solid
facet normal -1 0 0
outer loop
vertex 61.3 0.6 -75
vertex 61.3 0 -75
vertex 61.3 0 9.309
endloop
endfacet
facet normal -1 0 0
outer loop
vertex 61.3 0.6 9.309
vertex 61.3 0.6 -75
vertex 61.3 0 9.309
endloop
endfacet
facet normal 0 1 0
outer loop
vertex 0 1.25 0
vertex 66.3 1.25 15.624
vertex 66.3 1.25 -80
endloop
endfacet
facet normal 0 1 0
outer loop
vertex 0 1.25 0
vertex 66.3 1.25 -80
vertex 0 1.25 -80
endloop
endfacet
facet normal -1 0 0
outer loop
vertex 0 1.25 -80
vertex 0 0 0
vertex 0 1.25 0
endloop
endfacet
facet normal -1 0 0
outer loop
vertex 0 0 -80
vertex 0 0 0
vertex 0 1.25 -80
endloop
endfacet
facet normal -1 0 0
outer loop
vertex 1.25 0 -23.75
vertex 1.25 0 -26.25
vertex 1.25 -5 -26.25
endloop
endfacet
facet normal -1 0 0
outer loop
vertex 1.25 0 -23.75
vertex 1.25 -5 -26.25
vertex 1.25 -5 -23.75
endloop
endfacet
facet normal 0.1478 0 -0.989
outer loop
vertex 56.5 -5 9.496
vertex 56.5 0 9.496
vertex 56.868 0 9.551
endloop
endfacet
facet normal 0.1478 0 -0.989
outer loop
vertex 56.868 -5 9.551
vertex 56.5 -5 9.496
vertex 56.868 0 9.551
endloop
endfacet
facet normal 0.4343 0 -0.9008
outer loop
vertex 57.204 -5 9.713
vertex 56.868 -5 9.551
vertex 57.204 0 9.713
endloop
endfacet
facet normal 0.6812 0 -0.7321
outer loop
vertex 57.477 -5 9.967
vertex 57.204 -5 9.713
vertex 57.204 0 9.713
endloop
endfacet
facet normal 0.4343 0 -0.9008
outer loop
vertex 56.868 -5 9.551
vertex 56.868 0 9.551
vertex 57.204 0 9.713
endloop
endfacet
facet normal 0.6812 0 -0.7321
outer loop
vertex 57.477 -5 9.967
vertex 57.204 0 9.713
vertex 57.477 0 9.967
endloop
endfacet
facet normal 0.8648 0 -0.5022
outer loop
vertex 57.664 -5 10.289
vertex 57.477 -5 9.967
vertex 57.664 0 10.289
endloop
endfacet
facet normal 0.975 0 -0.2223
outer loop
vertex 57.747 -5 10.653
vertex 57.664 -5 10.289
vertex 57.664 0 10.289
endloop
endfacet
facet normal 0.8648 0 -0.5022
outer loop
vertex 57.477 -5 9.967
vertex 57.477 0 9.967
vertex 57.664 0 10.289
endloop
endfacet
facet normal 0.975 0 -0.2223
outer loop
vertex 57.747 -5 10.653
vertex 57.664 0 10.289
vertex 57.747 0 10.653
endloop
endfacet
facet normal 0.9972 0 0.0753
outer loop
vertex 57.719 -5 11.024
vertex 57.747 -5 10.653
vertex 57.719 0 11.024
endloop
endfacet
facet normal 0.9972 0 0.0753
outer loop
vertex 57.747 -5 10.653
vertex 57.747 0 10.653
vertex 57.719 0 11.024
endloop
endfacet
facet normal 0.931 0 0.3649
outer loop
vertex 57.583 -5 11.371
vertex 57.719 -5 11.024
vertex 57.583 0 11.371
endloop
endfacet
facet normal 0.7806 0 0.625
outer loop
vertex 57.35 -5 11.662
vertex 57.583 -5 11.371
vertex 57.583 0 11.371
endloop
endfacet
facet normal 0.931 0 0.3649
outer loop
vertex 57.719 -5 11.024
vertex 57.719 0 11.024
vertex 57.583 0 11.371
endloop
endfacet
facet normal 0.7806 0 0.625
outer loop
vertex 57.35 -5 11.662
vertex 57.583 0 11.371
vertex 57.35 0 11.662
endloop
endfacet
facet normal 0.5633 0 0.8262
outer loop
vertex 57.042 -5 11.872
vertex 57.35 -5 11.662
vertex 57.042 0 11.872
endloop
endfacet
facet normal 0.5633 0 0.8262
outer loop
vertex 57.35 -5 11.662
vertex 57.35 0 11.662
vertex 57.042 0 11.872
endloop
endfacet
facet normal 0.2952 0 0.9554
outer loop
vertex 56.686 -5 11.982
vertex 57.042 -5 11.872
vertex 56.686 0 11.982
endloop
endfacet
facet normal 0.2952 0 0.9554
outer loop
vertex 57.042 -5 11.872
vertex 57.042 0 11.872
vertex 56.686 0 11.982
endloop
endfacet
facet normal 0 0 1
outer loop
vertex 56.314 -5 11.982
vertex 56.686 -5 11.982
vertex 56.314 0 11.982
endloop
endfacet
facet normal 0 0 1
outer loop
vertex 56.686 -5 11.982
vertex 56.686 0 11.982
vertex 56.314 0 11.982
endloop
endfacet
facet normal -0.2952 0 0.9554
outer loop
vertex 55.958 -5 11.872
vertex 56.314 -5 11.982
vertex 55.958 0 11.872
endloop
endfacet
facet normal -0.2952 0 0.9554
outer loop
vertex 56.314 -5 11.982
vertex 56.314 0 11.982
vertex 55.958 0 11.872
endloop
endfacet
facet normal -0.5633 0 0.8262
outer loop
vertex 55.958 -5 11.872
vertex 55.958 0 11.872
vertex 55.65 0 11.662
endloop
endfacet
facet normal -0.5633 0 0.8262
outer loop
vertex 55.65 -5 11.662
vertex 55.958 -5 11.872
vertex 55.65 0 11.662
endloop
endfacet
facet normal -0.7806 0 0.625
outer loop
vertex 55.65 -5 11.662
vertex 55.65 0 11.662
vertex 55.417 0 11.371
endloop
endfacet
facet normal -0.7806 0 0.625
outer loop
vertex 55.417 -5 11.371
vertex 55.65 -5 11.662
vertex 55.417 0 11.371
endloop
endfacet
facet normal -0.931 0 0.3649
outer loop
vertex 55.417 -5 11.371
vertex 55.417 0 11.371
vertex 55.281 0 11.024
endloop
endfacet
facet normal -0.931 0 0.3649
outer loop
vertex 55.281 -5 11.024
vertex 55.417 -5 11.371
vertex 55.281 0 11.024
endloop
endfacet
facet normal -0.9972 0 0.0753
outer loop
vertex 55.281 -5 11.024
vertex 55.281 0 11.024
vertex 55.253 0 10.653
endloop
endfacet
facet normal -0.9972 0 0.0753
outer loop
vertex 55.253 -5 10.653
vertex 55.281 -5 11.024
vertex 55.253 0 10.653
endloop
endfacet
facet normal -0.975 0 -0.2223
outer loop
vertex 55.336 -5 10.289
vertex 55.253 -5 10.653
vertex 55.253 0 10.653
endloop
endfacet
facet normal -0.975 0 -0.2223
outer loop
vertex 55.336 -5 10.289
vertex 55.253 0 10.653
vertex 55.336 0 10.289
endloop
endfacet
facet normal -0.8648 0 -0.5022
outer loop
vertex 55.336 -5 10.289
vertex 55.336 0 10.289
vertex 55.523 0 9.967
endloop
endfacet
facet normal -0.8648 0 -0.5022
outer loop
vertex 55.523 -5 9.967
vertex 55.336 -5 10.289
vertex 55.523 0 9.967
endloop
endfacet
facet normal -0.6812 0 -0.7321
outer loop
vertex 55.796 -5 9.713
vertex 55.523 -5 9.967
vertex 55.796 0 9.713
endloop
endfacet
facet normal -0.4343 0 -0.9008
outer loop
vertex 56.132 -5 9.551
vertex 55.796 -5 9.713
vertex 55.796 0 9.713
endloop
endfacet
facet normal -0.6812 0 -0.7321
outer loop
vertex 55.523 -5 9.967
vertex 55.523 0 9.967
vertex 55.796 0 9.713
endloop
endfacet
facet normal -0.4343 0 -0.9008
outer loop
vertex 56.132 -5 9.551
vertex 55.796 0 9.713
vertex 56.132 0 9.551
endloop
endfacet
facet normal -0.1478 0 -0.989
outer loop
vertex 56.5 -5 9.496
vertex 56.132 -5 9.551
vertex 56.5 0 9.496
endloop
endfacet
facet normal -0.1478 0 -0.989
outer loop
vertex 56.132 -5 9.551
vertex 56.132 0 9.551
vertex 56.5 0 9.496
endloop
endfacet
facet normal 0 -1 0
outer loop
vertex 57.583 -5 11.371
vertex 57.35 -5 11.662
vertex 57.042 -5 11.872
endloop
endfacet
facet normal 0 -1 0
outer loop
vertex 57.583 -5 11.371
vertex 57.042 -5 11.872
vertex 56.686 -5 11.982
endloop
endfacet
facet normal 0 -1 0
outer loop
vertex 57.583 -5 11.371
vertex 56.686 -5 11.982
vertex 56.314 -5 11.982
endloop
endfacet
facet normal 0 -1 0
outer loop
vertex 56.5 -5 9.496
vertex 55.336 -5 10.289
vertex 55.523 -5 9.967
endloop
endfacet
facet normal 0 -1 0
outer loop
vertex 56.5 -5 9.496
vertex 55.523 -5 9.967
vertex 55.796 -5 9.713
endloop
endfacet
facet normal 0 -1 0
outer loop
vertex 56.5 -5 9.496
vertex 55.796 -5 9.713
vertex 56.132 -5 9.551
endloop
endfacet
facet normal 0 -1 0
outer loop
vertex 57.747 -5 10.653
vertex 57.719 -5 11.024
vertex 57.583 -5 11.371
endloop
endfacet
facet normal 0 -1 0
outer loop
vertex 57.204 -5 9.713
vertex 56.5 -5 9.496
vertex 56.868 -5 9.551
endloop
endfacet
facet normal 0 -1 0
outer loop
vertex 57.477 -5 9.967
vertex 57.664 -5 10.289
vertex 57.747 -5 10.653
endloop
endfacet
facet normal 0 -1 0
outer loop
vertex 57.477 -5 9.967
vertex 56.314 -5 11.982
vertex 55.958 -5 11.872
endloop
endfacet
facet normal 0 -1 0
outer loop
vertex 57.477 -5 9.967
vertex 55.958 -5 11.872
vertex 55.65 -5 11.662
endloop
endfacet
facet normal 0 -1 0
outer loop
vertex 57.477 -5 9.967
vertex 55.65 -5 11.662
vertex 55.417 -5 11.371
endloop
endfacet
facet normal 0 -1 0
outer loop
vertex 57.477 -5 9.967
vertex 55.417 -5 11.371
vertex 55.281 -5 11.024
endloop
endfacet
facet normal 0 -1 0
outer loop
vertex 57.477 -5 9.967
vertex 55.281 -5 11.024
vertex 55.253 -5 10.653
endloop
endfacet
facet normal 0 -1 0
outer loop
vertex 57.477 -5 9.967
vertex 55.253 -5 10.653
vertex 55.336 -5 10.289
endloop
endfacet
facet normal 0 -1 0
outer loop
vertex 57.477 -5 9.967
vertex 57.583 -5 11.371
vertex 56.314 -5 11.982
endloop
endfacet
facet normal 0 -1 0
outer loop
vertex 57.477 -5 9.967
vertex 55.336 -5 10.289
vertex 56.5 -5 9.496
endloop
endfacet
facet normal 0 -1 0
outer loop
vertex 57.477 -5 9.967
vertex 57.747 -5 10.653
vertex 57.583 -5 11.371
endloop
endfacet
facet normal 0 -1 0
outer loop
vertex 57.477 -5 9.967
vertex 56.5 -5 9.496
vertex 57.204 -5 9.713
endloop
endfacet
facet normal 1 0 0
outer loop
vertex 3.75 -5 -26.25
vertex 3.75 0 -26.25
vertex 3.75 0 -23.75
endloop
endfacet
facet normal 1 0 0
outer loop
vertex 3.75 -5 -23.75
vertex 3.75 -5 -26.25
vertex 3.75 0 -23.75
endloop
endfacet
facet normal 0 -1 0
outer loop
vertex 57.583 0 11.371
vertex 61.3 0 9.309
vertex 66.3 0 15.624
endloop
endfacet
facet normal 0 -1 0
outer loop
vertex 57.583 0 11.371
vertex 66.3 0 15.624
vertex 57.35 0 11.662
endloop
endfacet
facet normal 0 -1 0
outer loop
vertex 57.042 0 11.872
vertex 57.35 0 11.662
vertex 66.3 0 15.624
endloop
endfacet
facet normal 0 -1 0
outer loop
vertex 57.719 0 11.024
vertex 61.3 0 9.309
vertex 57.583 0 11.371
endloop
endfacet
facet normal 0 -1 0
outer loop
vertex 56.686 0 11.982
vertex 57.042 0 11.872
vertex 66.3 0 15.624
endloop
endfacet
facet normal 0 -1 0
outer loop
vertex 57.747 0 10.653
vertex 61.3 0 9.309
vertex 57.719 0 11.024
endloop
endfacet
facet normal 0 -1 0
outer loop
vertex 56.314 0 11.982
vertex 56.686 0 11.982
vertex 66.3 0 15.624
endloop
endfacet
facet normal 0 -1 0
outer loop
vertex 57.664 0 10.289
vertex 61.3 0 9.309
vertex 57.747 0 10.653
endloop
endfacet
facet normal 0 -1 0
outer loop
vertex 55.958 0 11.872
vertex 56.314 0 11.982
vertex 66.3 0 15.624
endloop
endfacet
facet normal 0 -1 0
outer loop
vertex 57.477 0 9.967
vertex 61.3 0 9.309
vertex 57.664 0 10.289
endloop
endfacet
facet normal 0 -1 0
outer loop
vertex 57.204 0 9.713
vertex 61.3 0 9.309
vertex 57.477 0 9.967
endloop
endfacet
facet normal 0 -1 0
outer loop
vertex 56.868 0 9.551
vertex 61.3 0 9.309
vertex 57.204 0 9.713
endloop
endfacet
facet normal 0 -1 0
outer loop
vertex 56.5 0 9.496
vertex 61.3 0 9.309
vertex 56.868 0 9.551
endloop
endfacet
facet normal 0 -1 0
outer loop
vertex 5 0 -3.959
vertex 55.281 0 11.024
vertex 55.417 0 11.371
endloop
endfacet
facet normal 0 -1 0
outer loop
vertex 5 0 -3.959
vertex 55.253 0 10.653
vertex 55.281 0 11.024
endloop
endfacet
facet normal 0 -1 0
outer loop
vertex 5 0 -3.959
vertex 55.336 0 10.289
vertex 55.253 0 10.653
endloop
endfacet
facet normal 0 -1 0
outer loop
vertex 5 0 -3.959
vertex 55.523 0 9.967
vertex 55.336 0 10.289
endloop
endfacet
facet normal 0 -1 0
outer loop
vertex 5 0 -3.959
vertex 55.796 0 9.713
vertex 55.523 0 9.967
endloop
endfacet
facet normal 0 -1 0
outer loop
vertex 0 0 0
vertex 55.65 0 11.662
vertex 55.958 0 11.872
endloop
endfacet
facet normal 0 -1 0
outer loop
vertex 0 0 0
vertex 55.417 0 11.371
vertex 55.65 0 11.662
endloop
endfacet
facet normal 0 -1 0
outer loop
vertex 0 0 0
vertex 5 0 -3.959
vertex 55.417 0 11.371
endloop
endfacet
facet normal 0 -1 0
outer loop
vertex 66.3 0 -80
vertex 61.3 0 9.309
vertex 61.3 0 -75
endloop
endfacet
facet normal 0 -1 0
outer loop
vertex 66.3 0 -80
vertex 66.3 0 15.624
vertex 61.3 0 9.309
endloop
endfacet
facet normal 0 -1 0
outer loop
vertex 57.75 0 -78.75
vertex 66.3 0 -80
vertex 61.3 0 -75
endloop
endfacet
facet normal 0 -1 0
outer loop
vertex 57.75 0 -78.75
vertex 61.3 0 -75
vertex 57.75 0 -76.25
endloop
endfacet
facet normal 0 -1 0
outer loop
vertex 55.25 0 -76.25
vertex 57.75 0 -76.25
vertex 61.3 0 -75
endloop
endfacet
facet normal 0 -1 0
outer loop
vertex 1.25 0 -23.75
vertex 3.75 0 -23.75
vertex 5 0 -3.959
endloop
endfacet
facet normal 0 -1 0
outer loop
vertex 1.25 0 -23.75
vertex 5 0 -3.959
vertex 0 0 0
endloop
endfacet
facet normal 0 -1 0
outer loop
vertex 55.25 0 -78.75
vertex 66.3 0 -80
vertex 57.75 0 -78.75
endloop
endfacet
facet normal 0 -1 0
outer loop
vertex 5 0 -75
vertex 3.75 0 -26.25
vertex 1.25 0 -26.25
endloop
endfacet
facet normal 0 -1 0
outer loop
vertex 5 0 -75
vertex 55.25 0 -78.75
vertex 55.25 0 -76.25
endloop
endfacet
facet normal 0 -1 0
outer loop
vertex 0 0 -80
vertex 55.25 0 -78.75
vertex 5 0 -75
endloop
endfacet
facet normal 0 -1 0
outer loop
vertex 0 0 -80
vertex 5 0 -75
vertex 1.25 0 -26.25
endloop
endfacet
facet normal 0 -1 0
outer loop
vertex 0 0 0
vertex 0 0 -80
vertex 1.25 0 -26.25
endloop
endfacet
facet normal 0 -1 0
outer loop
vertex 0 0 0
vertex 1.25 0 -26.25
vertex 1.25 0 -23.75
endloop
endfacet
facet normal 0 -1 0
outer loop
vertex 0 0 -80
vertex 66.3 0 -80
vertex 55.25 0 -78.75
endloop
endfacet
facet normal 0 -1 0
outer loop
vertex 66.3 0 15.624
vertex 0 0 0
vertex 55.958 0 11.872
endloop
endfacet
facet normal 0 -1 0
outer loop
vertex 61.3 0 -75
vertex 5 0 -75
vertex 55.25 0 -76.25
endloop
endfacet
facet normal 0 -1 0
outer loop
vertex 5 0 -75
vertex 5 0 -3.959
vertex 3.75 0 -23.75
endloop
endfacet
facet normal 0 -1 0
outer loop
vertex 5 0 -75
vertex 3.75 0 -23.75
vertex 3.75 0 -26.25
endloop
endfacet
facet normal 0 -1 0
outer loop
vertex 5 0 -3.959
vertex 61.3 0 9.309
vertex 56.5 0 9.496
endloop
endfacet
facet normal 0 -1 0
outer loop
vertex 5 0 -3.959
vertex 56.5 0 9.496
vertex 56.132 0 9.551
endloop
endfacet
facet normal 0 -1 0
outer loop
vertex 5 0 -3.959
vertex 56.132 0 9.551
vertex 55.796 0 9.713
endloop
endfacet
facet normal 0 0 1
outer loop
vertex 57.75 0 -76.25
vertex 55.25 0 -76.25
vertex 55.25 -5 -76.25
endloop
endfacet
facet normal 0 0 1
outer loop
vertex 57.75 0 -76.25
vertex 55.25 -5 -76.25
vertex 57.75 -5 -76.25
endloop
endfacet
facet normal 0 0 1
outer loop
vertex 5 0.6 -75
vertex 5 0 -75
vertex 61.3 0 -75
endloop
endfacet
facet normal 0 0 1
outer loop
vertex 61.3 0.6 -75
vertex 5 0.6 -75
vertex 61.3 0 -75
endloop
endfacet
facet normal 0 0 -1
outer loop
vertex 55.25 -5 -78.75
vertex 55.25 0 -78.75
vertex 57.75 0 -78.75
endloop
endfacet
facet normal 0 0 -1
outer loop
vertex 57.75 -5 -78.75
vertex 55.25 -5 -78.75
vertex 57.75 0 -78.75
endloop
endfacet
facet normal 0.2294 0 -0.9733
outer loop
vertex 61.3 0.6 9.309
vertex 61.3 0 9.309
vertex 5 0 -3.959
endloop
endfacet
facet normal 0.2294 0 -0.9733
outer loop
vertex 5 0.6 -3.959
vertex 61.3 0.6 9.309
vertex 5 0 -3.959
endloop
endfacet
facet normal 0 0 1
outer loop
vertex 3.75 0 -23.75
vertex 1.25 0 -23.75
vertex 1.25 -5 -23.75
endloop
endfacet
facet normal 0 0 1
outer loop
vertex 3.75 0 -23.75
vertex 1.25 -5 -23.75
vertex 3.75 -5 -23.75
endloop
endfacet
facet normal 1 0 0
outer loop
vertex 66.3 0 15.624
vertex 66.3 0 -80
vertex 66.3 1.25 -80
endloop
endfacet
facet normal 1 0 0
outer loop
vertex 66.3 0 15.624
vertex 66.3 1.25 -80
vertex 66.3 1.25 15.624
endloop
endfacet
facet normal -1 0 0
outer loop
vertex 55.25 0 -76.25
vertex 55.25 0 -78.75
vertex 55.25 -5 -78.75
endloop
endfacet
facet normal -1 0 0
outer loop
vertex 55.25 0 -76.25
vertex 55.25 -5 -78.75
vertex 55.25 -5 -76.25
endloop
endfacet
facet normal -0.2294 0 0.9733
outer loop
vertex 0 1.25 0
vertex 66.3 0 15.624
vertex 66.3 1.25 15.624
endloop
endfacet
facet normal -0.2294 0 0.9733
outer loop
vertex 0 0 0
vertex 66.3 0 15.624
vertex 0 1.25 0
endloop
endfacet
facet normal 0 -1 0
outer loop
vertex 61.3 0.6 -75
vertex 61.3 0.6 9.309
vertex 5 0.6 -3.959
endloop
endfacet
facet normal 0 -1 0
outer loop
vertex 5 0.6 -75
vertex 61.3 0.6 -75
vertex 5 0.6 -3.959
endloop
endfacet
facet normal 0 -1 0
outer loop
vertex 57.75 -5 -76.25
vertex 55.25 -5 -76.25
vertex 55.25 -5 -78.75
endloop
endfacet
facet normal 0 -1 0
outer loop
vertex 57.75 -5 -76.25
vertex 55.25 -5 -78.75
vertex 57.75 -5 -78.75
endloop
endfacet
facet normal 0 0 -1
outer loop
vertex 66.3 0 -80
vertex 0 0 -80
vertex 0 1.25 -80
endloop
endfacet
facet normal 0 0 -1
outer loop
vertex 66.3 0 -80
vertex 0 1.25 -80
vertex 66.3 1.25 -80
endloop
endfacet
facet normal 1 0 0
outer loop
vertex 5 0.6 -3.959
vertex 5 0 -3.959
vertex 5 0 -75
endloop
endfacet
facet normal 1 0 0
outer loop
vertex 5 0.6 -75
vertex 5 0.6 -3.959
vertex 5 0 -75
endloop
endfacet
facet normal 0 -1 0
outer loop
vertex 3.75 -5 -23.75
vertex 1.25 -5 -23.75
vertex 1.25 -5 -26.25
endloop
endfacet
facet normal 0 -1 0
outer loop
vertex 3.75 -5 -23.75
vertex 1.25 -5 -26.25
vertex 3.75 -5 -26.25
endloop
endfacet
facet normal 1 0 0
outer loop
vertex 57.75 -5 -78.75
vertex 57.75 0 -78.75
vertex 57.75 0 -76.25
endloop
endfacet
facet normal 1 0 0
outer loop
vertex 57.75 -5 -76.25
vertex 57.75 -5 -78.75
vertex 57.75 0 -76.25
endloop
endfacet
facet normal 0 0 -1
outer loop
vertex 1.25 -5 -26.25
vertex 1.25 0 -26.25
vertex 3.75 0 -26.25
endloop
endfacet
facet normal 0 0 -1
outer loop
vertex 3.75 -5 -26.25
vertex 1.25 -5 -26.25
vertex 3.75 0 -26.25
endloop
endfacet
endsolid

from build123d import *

# Parameters (mm, degrees)
BOSS_EXTRUDE1_DEPTH = 1.25
SKETCH2_R           = 1.25
SKETCH2_W           = 2.5
SKETCH2_H           = 2.5
BOSS_EXTRUDE2_DEPTH = 5
CUT_EXTRUDE1_DEPTH  = 0.6


with BuildPart() as part:
    # Sketch1 → Boss-Extrude1 (new body)
    with BuildSketch(Plane(origin=(0, 0, 0), x_dir=(1, 0, 0), z_dir=(0, 1, 0))):
        Polygon((0, 0), (0, 80), (66.3, 80), (66.3, -15.623791318), align=None)
    extrude(amount=BOSS_EXTRUDE1_DEPTH)

    # Sketch2 → Boss-Extrude2 (add)
    with BuildSketch(Plane.XZ):
        with Locations(Location((56.5, 10.745914737, 0), (0, 0, 270))):
            Circle(SKETCH2_R)
        with Locations((56.5, -77.5)):
            Rectangle(SKETCH2_W, SKETCH2_H)
        with Locations((2.5, -25)):
            Rectangle(SKETCH2_W, SKETCH2_H)
    extrude(amount=BOSS_EXTRUDE2_DEPTH)

    # Sketch3 → Cut-Extrude1 (cut)
    with BuildSketch(Plane(origin=(0, 0, 0), x_dir=(-1, 0, 0), z_dir=(0, -1, 0))):
        Polygon((-61.3, 75), (-61.3, -9.308571388), (-5, 3.958690319), (-5, 75), align=None)
    extrude(amount=-CUT_EXTRUDE1_DEPTH, mode=Mode.SUBTRACT)


solid = part.part
